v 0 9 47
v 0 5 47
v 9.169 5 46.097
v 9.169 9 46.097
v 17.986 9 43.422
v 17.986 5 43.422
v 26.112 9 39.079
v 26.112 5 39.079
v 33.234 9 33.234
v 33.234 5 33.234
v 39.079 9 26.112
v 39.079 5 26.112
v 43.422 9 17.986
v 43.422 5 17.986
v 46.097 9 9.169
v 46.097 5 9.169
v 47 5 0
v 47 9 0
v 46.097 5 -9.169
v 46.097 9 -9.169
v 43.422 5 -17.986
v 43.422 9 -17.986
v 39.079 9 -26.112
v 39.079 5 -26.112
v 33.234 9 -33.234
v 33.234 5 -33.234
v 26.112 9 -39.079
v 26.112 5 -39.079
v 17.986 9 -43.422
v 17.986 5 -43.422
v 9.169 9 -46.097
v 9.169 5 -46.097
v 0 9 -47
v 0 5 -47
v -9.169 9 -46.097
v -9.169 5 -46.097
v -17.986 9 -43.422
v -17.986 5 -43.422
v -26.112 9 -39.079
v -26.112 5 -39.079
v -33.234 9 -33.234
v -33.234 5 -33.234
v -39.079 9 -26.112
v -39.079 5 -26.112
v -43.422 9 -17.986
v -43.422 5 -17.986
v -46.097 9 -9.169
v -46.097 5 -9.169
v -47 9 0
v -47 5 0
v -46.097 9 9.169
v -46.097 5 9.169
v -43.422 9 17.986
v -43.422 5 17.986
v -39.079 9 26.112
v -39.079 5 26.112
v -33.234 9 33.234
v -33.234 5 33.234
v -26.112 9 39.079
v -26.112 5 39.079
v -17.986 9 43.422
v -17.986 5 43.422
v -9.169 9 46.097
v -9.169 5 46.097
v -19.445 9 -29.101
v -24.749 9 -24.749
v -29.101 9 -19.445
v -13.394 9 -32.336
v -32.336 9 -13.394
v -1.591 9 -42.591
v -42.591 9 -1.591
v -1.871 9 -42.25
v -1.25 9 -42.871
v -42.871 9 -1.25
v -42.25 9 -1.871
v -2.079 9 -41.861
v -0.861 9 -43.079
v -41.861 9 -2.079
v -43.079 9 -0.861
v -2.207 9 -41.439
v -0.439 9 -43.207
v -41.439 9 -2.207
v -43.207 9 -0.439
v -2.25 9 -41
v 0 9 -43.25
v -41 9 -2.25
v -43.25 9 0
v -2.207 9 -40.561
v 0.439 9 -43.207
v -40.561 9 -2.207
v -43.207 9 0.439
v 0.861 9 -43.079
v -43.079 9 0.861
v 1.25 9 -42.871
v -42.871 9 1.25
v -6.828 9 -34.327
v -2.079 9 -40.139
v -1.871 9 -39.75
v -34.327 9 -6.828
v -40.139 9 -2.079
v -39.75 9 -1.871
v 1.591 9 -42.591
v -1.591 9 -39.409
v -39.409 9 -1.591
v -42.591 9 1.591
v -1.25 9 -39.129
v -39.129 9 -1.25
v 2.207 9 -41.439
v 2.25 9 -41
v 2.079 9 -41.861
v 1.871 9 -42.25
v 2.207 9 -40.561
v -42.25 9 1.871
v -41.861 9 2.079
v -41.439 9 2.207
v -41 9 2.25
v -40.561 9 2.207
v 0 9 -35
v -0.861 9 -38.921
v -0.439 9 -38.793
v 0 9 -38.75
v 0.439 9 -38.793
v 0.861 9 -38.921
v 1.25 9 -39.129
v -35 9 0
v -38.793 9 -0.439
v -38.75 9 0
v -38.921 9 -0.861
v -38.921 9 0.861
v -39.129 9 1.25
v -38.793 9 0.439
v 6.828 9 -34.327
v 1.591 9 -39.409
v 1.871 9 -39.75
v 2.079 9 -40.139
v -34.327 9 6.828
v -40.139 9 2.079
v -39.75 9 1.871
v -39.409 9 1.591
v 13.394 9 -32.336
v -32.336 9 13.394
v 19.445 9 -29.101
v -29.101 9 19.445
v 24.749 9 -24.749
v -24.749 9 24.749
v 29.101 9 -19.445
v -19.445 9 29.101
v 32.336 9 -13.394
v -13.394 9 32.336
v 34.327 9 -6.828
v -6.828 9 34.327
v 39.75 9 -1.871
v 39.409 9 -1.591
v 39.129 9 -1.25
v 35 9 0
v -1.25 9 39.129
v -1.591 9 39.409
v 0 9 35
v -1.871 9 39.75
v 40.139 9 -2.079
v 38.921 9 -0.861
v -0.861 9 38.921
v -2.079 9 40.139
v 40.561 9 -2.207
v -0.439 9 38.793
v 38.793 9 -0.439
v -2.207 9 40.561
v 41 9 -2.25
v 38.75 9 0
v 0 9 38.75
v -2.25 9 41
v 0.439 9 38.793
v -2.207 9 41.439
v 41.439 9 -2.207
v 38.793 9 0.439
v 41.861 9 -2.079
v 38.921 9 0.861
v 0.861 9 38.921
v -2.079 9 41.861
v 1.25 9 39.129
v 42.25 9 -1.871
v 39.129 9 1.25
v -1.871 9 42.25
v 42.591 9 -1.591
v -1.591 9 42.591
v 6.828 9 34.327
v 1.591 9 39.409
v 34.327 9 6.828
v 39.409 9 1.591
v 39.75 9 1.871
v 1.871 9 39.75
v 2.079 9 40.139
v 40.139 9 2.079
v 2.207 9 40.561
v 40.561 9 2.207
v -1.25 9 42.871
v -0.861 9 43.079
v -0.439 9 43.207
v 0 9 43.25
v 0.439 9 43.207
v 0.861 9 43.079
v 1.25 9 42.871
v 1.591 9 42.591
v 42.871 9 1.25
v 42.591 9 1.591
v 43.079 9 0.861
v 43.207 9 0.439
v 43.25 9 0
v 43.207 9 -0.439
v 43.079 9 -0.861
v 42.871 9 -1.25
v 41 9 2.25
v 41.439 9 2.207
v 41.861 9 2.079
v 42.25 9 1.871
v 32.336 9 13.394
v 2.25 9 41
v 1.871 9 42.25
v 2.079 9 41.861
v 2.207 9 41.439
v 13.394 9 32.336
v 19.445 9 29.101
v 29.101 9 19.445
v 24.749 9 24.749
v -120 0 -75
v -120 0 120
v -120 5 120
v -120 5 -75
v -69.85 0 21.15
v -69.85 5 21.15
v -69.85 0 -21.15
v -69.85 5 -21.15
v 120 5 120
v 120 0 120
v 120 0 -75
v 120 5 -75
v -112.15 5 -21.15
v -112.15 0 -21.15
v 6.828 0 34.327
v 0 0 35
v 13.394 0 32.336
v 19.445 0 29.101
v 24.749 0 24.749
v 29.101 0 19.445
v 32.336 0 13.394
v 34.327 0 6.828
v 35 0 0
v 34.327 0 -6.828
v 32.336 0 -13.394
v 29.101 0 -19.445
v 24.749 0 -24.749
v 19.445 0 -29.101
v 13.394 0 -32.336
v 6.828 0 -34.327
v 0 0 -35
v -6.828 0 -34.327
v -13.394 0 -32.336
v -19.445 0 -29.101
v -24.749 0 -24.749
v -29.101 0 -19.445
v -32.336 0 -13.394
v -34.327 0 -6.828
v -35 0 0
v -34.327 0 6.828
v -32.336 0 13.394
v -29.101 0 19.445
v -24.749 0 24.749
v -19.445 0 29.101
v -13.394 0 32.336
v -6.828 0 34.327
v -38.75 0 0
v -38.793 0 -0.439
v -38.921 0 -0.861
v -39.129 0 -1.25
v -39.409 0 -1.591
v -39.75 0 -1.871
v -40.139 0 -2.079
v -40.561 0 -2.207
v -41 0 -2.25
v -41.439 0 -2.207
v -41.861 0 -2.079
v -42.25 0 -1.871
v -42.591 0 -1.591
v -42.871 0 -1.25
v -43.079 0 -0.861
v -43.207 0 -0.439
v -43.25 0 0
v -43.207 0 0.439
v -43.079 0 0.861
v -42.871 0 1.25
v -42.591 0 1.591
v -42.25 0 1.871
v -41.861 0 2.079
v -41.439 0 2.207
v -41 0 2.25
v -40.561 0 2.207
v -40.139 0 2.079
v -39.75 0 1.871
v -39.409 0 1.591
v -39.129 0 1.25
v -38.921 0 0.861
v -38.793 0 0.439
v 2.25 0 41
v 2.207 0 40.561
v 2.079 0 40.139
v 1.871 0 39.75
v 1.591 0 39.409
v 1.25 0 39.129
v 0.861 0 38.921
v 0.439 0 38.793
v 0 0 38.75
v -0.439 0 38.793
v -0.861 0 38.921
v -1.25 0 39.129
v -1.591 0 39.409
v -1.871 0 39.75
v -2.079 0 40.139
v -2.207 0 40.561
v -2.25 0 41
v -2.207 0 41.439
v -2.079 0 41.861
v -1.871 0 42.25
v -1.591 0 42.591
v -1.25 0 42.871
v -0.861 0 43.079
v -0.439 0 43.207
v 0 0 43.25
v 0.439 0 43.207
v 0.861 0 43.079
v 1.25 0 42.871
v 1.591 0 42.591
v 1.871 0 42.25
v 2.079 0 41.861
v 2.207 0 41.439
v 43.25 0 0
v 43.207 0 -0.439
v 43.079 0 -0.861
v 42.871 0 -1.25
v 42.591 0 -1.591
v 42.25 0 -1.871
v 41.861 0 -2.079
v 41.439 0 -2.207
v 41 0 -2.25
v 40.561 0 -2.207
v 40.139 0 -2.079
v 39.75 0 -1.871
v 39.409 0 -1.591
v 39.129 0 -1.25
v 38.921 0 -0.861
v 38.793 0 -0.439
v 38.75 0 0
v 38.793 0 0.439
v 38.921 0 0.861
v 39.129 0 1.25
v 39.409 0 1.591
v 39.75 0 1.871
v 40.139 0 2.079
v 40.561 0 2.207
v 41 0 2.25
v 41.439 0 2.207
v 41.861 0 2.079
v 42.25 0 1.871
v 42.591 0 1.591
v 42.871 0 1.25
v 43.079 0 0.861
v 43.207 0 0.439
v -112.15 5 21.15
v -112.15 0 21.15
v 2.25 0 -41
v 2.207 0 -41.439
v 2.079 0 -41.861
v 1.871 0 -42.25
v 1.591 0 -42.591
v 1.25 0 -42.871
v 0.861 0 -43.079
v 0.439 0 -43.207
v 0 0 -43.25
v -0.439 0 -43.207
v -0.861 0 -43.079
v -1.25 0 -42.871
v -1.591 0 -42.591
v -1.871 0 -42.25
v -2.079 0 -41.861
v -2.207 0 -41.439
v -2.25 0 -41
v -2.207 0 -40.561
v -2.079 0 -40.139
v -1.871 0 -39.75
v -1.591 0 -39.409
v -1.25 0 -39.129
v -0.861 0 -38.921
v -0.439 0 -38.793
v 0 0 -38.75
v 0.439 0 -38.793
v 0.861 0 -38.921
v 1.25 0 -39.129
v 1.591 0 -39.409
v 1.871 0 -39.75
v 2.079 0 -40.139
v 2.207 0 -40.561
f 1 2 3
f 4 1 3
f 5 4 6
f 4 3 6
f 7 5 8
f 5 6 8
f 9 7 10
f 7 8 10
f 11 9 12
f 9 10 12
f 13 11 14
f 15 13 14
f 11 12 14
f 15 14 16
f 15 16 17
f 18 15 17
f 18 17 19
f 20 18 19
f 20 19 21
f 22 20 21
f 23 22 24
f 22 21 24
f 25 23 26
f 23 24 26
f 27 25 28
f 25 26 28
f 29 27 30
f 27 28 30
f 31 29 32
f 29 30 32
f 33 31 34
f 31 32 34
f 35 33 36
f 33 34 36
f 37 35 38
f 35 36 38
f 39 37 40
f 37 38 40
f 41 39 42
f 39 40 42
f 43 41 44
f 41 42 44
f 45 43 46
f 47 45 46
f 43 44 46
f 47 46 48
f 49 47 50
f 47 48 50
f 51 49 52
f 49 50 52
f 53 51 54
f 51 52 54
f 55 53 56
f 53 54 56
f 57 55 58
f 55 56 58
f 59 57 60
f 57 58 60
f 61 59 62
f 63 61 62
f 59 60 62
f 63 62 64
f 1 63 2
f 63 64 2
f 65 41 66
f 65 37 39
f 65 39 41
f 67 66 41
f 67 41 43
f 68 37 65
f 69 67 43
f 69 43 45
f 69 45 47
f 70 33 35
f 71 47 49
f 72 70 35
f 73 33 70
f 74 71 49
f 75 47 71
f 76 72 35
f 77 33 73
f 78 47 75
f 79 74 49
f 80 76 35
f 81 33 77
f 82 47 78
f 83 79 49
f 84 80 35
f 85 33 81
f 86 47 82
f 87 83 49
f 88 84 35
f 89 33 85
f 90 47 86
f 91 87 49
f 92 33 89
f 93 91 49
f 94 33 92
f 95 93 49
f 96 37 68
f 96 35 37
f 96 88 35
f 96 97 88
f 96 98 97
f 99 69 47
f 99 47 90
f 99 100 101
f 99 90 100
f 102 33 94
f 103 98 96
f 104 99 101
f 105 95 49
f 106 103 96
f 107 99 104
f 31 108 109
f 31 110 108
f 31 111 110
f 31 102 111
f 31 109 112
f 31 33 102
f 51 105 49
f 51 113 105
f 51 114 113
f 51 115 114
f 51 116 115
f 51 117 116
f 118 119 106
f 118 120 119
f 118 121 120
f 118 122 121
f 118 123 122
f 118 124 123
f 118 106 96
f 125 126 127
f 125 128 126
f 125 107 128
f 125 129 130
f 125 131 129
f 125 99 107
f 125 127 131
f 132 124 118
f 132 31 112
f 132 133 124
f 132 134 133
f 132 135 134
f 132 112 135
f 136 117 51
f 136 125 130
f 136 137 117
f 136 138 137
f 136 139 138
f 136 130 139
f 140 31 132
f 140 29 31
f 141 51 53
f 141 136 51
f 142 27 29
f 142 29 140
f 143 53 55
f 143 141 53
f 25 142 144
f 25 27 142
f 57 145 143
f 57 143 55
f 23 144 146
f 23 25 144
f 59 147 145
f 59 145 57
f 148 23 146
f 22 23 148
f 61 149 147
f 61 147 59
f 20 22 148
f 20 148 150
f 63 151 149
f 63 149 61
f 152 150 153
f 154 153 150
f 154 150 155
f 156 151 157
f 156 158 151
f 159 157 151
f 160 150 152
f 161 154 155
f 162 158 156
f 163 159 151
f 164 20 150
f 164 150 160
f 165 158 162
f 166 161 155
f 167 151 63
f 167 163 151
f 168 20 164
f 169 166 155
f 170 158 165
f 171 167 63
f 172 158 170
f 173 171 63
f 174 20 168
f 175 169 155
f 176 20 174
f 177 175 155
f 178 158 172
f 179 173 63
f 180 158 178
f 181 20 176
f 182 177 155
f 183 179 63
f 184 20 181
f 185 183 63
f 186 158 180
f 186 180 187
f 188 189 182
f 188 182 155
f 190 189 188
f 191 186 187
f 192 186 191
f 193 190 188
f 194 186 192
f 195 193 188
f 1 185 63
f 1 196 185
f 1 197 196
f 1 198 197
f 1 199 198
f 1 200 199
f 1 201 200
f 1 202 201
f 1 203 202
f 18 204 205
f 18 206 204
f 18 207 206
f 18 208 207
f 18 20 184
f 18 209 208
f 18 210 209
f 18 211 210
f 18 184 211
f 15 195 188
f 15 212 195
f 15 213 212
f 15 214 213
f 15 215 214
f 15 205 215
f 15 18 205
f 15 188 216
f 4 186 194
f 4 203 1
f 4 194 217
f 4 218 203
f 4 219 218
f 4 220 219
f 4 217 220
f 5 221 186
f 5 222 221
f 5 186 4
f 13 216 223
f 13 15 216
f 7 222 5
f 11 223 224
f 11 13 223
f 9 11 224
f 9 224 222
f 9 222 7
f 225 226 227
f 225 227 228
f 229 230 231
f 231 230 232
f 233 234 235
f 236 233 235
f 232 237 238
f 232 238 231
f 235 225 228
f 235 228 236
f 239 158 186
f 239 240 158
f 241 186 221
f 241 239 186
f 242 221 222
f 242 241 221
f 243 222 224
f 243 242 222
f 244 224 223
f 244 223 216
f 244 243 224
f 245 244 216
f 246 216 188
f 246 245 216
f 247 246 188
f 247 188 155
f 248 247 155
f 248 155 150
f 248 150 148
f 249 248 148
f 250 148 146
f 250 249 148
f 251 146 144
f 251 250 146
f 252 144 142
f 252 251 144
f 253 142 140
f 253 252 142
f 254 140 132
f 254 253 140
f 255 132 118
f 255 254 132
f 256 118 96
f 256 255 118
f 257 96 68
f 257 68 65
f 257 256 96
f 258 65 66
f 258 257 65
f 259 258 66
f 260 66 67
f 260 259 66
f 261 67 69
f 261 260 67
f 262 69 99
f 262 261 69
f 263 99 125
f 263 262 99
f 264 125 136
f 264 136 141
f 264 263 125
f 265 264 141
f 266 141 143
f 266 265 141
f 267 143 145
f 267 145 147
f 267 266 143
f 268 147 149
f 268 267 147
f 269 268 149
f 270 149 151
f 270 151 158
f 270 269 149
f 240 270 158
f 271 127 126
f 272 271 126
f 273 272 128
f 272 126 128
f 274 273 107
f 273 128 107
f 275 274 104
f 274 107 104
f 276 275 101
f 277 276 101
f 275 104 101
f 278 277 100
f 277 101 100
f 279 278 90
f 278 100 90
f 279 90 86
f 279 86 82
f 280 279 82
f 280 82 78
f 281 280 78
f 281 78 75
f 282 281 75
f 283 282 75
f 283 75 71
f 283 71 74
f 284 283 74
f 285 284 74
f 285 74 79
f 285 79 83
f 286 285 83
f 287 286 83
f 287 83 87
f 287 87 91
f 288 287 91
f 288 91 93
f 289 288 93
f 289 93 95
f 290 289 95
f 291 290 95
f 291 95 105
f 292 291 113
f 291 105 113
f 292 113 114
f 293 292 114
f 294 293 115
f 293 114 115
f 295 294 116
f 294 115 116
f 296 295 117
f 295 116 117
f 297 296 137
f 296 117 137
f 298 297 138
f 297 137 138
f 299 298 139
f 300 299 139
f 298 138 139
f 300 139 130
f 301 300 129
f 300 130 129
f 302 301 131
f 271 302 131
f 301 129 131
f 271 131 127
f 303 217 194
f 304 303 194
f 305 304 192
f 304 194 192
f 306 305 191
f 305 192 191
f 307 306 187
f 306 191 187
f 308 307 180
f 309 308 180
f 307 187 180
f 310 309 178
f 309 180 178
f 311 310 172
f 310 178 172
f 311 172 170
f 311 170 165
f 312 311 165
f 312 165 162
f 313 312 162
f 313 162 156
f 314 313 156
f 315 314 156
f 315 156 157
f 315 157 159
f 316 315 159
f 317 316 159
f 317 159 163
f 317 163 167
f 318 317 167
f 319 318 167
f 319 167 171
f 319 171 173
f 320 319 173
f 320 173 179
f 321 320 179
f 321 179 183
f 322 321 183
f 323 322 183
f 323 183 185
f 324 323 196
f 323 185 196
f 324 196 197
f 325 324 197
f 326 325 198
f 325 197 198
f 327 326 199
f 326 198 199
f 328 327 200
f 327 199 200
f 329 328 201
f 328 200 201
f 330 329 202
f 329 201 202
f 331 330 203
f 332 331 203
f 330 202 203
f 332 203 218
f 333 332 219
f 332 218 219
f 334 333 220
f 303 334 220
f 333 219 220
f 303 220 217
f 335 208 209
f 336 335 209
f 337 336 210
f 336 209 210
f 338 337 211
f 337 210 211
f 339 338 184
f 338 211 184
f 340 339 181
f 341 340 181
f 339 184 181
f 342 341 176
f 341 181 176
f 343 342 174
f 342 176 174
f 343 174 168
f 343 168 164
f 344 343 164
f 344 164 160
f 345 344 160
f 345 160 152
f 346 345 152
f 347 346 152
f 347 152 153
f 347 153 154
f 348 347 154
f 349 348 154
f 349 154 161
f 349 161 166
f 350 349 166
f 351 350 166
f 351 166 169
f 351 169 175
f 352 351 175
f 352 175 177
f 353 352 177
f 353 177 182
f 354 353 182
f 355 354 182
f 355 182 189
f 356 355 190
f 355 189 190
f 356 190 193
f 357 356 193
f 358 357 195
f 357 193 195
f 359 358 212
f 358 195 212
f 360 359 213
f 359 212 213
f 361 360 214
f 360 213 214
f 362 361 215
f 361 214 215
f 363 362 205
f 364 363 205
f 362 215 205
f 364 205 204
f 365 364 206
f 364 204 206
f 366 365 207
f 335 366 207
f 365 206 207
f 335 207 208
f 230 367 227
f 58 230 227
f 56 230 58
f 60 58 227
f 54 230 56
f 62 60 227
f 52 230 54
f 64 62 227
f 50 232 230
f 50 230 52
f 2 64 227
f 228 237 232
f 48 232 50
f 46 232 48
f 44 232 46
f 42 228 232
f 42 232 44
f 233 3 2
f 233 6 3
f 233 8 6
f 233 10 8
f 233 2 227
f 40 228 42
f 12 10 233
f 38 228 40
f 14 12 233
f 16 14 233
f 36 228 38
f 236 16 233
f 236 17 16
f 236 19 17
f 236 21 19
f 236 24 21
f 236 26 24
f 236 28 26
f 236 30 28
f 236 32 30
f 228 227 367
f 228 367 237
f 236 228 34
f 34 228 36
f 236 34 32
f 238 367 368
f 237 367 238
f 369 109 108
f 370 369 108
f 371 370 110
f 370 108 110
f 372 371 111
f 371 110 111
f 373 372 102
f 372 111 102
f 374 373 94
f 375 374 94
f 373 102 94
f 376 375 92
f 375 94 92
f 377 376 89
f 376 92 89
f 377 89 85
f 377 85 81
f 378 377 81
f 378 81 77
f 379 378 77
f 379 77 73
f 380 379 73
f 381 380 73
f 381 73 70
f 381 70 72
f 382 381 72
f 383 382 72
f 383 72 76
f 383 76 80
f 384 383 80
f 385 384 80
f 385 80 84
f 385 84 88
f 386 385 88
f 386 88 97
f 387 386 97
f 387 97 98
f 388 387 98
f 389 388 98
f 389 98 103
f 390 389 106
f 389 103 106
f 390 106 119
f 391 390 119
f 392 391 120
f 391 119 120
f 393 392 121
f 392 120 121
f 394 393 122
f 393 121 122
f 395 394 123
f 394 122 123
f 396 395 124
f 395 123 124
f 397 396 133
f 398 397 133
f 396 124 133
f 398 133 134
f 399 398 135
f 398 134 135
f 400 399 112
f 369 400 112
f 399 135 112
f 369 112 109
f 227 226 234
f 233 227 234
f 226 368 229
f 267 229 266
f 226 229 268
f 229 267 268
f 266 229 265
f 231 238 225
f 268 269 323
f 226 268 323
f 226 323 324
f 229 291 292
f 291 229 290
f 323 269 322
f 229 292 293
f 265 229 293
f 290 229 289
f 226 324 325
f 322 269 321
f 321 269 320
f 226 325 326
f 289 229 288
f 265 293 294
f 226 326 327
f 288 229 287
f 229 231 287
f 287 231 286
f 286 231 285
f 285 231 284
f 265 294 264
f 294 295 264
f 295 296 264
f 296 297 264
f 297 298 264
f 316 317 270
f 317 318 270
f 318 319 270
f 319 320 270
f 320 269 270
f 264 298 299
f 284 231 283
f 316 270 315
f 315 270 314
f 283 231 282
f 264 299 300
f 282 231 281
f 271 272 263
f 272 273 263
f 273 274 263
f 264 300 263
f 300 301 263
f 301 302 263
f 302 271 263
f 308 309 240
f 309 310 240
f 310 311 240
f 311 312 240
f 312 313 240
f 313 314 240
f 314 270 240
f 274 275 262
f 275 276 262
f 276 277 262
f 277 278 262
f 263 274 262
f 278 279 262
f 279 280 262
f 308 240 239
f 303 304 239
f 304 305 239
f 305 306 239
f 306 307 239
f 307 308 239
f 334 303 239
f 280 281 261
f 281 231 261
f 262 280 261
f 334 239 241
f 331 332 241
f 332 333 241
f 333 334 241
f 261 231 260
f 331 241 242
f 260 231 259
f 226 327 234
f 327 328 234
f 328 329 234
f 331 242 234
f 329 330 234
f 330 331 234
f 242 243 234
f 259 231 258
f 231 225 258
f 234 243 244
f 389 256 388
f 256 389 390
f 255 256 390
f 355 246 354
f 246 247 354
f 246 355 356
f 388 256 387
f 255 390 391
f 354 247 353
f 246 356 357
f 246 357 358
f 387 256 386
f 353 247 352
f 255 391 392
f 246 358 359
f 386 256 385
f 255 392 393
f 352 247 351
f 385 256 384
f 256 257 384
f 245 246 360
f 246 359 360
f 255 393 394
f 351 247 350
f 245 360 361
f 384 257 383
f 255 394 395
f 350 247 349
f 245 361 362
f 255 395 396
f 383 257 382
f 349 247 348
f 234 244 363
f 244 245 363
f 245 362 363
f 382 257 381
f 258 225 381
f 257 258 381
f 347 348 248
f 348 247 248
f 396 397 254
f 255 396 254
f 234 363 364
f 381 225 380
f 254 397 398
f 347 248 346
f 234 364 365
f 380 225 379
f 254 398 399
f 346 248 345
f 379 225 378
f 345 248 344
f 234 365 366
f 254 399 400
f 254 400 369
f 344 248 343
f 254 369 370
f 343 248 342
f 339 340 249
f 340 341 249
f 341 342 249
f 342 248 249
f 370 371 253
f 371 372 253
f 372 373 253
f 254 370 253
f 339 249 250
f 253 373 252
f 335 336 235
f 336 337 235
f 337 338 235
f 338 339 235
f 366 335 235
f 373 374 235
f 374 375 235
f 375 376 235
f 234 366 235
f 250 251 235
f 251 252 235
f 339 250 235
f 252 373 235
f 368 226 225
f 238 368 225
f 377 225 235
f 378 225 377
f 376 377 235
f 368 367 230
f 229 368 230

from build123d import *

# Parameters (mm, degrees)
SCHIZZO1_W                   = 240
SCHIZZO1_H                   = 195
SCHIZZO1_R                   = 35
ESTRUSIONE_ESTRUSIONE1_DEPTH = 5
SCHIZZO3_R                   = 47
SCHIZZO3_R_2                 = 35
ESTRUSIONE_ESTRUSIONE2_DEPTH = 4
FORO_PER_VITE_M3_1_D         = 4.5
FORO_PER_VITE_M3_1_DEPTH     = 18.1
FORO_PER_VITE_M3_1_TIP       = 1.351936393
SCHIZZO7_W                   = 42.3
SCHIZZO7_H                   = 42.3
TAGLIO_ESTRUSIONE1_DEPTH     = 14


with BuildPart() as part:
    # Schizzo1 → Estrusione-Estrusione1 (new body)
    with BuildSketch(Plane(origin=(0, 0, 0), x_dir=(1, 0, 0), z_dir=(0, 1, 0))):
        with Locations((0, -22.5)):
            Rectangle(SCHIZZO1_W, SCHIZZO1_H)
        with Locations(Location((0, 0, 0), (0, 0, 270))):
            Circle(SCHIZZO1_R, mode=Mode.SUBTRACT)
    extrude(amount=ESTRUSIONE_ESTRUSIONE1_DEPTH)

    # Schizzo3 → Estrusione-Estrusione2 (add)
    with BuildSketch(Plane(origin=(0, 5, 0), x_dir=(1, 0, 0), z_dir=(0, 1, 0))):
        with Locations(Location((0, 0, 0), (0, 0, 270))):
            Circle(SCHIZZO3_R)
        with Locations(Location((0, 0, 0), (0, 0, 270))):
            Circle(SCHIZZO3_R_2, mode=Mode.SUBTRACT)
    extrude(amount=ESTRUSIONE_ESTRUSIONE2_DEPTH)

    # Foro per Vite M3-1
    with Locations(Plane(origin=(0, 0, 0), x_dir=(-1, 0, 0), z_dir=(0, -1, 0))):
        with Locations((-41, 0), (0, 41), (41, 0), (0, -41)):
            Hole(FORO_PER_VITE_M3_1_D / 2, depth=FORO_PER_VITE_M3_1_DEPTH)
            with Locations((0, 0, -(FORO_PER_VITE_M3_1_DEPTH + FORO_PER_VITE_M3_1_TIP / 2))):  # 118° drill point
                Cone(0, FORO_PER_VITE_M3_1_D / 2, FORO_PER_VITE_M3_1_TIP, mode=Mode.SUBTRACT)

    # Schizzo7 → Taglio-Estrusione1 (cut)
    with BuildSketch(Plane(origin=(0, 5, 0), x_dir=(1, 0, 0), z_dir=(0, 1, 0))):
        with Locations((-91, 0)):
            Rectangle(SCHIZZO7_W, SCHIZZO7_H)
    extrude(amount=-TAGLIO_ESTRUSIONE1_DEPTH, mode=Mode.SUBTRACT)


solid = part.part
